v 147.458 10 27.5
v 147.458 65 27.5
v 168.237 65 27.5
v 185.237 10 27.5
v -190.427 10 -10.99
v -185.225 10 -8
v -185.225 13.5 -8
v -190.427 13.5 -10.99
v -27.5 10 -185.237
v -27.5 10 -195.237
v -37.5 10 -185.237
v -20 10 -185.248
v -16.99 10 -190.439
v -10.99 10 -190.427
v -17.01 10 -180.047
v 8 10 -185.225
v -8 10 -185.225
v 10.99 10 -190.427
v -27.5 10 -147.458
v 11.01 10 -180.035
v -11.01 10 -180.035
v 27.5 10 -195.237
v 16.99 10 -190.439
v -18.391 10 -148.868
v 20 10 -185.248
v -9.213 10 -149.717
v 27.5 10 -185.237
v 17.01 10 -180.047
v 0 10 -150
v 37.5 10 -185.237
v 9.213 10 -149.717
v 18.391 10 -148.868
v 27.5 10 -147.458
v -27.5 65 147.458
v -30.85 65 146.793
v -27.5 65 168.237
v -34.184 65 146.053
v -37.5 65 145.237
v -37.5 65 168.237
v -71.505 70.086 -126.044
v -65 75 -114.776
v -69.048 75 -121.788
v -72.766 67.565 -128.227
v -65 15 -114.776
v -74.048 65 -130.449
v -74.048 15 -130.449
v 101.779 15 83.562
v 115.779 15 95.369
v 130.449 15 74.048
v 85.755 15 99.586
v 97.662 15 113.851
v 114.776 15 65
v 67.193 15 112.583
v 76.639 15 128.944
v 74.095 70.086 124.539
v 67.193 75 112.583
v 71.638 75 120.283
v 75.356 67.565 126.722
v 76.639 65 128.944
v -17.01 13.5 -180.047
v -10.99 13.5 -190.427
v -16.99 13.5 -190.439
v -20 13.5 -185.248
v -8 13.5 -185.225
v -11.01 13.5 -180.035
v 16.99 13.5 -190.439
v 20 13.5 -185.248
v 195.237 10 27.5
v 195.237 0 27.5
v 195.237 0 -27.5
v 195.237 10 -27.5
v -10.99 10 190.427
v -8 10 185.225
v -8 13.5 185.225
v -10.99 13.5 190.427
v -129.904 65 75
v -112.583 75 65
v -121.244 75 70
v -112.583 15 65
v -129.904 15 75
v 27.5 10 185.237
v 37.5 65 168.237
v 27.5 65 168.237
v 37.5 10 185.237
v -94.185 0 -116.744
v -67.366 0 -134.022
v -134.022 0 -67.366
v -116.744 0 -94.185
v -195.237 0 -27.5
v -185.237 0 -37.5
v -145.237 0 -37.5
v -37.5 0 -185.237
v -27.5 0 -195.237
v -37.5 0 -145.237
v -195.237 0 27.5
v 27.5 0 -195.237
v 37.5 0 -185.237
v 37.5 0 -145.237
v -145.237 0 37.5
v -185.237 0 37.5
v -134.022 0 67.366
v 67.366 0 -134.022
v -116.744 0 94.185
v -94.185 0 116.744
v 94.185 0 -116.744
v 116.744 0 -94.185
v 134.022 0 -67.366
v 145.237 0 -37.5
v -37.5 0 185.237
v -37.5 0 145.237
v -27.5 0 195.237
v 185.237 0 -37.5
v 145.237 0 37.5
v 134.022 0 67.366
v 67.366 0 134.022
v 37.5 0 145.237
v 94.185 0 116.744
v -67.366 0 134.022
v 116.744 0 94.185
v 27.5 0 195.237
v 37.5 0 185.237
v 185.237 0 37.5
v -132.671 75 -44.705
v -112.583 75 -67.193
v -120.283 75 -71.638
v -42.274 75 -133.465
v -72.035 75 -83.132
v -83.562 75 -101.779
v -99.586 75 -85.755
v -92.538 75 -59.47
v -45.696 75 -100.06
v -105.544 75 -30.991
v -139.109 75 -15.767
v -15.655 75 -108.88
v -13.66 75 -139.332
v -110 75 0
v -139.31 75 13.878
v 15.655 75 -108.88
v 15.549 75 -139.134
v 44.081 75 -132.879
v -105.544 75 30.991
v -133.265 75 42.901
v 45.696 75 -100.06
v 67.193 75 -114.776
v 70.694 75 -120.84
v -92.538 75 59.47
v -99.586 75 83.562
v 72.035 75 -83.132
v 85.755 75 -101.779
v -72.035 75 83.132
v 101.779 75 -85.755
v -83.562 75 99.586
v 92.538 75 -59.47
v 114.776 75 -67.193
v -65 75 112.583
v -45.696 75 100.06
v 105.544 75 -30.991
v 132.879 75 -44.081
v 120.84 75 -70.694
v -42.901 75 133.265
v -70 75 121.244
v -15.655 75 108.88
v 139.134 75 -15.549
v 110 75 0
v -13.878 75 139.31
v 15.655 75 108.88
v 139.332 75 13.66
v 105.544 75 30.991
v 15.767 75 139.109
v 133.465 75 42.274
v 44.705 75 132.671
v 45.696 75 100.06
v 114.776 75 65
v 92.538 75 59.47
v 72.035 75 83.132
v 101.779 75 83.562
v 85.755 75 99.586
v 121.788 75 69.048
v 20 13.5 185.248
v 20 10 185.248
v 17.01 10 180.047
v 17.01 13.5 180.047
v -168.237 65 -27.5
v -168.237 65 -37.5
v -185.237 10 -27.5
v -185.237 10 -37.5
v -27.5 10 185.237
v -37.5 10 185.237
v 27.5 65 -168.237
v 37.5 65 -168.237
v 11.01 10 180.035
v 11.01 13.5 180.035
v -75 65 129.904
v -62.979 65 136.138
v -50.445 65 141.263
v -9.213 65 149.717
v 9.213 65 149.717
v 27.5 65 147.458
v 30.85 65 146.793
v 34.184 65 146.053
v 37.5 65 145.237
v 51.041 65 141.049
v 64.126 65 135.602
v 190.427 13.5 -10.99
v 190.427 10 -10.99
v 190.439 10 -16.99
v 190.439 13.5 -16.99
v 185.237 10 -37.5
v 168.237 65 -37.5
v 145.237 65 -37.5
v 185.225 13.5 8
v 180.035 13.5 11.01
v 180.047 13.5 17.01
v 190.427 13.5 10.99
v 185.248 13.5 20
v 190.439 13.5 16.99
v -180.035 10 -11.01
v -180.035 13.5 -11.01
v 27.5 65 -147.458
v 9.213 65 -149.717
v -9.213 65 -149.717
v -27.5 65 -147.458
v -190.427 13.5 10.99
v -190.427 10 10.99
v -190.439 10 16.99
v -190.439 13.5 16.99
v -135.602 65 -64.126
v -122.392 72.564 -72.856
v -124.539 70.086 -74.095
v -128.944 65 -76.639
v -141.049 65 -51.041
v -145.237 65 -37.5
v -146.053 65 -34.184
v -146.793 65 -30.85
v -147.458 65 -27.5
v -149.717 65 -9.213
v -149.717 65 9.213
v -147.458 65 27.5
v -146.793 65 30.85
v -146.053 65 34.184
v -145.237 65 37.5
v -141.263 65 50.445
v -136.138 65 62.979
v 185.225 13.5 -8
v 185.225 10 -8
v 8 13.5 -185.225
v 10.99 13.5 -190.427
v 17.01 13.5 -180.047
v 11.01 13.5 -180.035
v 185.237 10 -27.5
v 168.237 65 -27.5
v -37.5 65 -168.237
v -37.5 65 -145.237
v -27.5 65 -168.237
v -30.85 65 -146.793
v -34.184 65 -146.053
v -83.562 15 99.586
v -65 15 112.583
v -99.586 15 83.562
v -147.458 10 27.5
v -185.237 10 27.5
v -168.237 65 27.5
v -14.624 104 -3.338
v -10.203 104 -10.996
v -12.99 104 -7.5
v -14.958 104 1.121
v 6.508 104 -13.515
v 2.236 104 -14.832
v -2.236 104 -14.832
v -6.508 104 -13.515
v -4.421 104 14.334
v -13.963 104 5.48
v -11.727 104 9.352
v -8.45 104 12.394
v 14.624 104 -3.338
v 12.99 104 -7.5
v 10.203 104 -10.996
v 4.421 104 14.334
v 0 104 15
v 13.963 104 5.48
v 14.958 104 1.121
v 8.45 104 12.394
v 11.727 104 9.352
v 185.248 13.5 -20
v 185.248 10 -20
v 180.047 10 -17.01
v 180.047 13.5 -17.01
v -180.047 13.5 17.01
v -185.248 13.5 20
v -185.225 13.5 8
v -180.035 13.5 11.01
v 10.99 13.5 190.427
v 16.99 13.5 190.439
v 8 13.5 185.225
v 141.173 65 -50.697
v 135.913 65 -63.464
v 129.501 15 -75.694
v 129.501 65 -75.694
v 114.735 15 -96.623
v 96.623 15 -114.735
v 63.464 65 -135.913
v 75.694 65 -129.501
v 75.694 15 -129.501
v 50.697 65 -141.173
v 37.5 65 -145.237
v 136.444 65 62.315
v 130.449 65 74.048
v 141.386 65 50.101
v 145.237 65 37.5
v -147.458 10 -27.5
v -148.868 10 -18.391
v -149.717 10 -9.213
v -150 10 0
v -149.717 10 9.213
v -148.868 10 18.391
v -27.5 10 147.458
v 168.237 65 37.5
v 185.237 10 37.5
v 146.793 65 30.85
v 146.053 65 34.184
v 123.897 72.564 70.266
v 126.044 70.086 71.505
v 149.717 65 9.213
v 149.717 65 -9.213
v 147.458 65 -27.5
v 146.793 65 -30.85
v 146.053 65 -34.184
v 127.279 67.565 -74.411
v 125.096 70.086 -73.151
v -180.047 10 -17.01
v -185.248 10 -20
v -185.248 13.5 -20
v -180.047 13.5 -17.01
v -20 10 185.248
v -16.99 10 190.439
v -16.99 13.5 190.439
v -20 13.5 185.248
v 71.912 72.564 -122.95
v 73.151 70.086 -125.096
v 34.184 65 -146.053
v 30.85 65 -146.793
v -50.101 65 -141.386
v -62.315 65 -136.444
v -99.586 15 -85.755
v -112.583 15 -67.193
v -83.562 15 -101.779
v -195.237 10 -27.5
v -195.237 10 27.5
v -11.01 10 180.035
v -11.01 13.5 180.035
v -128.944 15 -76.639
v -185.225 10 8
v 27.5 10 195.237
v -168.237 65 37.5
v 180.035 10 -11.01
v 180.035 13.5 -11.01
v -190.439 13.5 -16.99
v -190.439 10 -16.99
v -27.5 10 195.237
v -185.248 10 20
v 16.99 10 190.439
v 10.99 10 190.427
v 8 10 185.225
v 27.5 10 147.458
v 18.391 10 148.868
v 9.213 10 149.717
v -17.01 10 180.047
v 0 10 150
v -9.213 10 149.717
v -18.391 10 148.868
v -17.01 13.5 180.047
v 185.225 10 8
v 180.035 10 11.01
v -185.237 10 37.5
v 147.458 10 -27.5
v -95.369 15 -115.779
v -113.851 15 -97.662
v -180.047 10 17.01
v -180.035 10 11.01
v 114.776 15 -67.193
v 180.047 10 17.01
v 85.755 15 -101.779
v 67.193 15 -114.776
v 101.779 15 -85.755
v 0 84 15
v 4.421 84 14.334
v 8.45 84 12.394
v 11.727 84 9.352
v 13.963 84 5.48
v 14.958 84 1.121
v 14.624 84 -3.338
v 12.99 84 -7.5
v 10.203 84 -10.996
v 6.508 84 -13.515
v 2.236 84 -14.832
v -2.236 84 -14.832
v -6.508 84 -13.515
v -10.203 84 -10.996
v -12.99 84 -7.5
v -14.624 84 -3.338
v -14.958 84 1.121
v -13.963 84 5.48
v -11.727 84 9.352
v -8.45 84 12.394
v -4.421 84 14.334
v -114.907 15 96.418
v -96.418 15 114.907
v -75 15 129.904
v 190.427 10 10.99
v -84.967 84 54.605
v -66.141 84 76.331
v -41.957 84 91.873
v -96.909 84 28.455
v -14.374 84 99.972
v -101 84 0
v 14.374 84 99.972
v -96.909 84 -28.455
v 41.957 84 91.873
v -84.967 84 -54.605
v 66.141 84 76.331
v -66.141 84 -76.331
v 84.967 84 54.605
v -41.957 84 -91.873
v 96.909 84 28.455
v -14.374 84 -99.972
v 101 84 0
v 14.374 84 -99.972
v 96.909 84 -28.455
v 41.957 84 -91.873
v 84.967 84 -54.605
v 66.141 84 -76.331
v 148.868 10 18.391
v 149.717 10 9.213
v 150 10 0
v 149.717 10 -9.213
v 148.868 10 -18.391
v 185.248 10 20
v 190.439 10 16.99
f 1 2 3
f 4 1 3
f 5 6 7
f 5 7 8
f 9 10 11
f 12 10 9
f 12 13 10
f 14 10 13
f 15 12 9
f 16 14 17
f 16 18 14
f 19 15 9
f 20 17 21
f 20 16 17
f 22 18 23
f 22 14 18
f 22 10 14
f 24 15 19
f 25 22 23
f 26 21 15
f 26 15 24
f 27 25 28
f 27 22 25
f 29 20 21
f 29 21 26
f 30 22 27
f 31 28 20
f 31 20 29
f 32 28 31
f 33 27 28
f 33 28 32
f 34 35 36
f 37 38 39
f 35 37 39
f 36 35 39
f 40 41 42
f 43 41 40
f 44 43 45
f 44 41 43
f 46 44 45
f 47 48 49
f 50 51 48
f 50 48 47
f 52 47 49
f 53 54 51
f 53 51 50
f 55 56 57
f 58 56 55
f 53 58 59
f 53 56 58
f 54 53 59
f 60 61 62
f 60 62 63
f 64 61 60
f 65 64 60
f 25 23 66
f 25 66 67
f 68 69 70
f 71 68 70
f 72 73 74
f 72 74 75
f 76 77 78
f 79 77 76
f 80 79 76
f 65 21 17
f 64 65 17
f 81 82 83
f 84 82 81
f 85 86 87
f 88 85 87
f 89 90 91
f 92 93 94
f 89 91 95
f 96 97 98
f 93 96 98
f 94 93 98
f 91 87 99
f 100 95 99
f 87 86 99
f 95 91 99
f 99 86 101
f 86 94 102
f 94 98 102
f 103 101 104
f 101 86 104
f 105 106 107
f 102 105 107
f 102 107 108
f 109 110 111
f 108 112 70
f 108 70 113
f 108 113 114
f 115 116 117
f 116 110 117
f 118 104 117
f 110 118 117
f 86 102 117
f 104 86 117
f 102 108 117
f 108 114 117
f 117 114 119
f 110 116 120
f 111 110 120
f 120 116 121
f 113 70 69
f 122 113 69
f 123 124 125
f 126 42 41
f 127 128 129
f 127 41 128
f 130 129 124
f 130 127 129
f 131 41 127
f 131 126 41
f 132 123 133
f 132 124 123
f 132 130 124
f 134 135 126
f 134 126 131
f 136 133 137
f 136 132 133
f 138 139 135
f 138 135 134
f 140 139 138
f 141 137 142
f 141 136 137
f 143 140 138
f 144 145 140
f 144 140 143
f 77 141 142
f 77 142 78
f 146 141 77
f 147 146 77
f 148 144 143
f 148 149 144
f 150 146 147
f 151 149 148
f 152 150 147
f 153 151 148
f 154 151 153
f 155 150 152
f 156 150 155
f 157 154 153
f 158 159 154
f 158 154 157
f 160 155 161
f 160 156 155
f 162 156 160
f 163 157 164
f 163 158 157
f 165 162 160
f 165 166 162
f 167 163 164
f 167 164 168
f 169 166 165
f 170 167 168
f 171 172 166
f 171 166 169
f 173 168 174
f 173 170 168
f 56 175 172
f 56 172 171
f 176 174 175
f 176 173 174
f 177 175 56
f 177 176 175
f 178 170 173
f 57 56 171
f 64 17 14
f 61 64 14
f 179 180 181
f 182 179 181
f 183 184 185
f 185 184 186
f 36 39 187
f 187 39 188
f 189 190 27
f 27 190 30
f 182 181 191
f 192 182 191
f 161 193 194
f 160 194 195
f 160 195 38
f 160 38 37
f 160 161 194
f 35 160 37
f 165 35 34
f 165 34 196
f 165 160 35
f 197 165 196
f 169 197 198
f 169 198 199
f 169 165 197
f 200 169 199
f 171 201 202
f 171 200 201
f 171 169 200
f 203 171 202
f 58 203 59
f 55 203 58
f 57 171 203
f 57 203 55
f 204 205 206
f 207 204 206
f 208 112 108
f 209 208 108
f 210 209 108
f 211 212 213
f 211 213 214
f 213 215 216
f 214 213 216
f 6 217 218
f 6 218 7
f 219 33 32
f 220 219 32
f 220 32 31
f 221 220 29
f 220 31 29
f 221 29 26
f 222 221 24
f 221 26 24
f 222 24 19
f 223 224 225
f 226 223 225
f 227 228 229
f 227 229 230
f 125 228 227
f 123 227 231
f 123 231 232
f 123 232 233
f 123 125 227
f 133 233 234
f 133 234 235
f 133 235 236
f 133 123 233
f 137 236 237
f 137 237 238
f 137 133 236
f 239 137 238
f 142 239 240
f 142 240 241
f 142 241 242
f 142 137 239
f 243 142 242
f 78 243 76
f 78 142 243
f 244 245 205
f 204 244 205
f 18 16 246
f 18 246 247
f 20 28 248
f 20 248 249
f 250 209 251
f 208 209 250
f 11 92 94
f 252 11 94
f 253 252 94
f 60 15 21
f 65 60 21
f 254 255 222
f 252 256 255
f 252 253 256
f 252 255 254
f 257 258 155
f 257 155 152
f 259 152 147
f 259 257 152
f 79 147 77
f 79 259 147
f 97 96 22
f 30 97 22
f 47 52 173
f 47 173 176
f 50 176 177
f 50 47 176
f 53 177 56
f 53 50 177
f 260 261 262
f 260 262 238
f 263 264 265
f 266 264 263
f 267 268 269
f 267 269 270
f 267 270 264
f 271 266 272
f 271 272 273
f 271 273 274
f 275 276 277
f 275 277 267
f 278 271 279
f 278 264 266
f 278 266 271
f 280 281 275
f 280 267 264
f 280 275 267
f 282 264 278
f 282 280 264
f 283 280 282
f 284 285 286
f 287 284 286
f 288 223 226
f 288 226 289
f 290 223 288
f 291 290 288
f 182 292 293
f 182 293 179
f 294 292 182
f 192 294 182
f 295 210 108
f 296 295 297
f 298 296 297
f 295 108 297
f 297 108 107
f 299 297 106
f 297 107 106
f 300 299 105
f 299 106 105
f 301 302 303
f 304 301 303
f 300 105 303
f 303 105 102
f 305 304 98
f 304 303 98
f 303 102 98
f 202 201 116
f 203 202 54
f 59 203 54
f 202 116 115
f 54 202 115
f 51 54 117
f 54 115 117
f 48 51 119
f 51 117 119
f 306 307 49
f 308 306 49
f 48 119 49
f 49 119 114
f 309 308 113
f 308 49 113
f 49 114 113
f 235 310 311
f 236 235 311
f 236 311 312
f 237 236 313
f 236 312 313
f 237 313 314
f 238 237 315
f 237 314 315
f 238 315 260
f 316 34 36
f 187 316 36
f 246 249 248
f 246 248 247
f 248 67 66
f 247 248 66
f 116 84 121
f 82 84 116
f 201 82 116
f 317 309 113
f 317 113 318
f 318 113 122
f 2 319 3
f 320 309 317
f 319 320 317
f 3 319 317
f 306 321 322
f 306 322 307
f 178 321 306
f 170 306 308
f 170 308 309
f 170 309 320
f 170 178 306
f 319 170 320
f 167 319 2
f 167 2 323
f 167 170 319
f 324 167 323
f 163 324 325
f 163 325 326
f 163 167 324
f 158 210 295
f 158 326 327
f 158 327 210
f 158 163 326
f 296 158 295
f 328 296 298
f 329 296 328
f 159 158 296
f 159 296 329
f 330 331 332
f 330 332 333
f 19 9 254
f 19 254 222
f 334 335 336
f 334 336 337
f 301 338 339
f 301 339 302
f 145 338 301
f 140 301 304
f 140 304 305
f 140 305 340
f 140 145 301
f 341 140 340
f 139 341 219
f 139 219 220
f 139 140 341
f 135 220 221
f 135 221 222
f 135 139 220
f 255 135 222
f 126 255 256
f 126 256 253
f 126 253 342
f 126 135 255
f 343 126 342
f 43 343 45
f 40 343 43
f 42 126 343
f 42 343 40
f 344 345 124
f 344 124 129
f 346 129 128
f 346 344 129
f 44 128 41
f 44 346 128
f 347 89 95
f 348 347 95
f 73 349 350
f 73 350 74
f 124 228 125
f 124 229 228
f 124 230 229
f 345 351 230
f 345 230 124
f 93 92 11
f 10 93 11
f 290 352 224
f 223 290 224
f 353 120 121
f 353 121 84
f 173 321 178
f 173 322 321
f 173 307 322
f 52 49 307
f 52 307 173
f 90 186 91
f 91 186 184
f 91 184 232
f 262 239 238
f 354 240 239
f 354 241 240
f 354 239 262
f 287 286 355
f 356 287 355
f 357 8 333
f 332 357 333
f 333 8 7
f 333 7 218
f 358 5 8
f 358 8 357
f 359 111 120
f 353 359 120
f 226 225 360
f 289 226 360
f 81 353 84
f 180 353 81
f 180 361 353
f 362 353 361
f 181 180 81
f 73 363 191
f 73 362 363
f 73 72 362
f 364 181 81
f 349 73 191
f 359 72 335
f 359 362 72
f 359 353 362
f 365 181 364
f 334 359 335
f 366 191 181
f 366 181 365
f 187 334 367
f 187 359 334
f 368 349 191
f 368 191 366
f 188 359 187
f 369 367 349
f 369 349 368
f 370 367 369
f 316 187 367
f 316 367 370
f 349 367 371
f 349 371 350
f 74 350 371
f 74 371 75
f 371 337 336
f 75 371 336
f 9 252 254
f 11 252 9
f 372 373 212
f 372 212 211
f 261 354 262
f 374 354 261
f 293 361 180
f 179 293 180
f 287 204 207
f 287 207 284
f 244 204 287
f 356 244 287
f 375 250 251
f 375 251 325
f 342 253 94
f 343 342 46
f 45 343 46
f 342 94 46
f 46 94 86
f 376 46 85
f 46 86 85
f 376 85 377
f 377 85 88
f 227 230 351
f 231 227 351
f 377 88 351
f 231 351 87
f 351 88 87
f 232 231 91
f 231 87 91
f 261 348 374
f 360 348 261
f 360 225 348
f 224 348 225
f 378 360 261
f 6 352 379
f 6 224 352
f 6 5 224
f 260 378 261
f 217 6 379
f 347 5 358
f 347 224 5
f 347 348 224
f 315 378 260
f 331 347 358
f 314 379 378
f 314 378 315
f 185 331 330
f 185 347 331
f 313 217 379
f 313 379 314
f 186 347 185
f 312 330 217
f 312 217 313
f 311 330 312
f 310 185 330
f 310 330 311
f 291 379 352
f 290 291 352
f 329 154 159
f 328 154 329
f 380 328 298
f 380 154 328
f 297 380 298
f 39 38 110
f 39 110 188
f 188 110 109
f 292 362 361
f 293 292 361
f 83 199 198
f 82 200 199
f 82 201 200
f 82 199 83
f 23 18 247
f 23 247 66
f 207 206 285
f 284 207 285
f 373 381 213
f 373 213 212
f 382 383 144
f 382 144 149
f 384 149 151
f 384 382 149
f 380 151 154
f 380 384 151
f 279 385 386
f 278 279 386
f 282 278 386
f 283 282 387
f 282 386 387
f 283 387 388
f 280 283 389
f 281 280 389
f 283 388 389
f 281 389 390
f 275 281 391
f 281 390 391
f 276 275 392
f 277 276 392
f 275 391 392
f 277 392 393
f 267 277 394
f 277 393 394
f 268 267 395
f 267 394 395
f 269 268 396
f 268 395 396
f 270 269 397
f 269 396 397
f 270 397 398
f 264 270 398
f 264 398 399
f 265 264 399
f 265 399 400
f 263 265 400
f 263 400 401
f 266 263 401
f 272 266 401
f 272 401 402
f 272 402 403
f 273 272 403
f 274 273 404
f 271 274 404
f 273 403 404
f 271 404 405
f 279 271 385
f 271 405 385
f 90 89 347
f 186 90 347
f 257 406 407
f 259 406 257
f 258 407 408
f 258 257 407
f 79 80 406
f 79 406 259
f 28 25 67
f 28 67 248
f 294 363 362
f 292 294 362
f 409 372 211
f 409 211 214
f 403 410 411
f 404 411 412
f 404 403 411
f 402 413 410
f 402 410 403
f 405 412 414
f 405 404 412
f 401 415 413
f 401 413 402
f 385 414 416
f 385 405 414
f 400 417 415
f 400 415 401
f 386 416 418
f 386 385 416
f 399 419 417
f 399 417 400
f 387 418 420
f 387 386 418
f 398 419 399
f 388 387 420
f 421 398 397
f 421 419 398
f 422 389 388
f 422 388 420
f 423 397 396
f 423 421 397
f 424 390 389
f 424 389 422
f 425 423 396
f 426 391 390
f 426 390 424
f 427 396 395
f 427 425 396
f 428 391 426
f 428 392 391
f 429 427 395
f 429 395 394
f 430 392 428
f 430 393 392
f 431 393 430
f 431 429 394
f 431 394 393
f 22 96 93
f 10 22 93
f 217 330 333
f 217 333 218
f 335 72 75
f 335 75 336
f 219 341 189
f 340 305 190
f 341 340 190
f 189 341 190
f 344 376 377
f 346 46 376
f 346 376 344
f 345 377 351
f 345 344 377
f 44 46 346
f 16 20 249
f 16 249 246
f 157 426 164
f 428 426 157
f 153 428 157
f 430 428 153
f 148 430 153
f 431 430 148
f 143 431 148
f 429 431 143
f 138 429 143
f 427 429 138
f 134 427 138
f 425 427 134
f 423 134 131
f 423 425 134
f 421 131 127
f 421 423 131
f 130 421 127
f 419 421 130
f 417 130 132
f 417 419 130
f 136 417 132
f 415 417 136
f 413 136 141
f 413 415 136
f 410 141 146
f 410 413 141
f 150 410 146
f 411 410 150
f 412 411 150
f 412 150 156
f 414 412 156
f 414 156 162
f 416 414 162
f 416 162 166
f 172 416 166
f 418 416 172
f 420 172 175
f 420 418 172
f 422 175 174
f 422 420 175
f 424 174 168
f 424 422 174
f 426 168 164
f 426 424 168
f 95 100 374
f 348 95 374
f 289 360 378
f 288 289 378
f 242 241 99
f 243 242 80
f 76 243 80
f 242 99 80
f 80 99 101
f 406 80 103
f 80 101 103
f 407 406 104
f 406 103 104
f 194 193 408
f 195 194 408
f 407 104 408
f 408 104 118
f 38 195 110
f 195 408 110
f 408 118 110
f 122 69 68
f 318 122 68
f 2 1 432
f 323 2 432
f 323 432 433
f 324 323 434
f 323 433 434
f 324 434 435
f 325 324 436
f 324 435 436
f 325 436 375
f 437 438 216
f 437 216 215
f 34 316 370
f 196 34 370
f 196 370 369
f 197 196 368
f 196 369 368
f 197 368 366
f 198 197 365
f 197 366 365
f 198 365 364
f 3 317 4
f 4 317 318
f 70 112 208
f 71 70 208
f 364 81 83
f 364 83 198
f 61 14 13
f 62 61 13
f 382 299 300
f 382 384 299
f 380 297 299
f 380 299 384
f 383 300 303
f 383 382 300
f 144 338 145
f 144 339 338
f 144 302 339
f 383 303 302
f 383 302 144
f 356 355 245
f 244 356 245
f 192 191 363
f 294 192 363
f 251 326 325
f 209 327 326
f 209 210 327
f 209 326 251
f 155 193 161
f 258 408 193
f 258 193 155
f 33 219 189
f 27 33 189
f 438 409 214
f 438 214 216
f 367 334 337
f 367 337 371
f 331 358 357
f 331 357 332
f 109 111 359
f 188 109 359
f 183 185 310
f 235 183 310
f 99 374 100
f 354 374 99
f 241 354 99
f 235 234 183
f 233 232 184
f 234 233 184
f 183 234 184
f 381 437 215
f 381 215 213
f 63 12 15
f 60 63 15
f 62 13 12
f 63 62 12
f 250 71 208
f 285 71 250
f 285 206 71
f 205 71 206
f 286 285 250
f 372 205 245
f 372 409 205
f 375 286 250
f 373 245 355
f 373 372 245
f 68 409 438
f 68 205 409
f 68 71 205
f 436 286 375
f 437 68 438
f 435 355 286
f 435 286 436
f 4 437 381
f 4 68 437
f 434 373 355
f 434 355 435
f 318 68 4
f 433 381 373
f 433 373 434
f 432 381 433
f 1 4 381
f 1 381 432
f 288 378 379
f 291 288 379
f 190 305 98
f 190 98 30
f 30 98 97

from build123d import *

# Parameters (mm, degrees)
SKETCH1_R                    = 150
BOSS_EXTRUDE1_DEPTH          = 75
CHAMFER1_SIZE                = 10
BOSS_EXTRUDE2_START          = -75
BOSS_EXTRUDE2_DEPTH          = 10
CHAMFER2_SIZE                = 10
BOSS_EXTRUDE3_DEPTH          = 10
BOSS_EXTRUDE4_DEPTH          = 3.5
CIRPATTERN1_COUNT            = 4
CIRPATTERN1_COPY_1_DEPTH     = 10
CIRPATTERN1_COPY_2_DEPTH     = 10
CIRPATTERN1_COPY_3_DEPTH     = 10
CIRPATTERN1_COPY_4_DEPTH     = 3.5
CIRPATTERN1_COPY_5_DEPTH     = 3.5
CIRPATTERN1_COPY_6_DEPTH     = 3.5
CHAMFER2_OF_CIRPATTERN1_SIZE = 10
CUT_EXTRUDE1_START           = -60
CUT_EXTRUDE1_DEPTH           = 60
CIRPATTERN3_COUNT            = 4
SKETCH15_R                   = 110
BOSS_EXTRUDE6_DEPTH          = 9
BOSS_EXTRUDE6_TAPER          = 45
SKETCH16_R                   = 15
BOSS_EXTRUDE7_DEPTH          = 20


# Read off the part's stored shape, not the designer's step: Cut-Extrude1
with BuildPart() as part:
    # Sketch1 → Boss-Extrude1 (new body)
    with BuildSketch(Plane(origin=(0, 0, 0), x_dir=(1, 0, 0), z_dir=(0, 1, 0))):
        with Locations(Location((0, 0, 0), (0, 0, 270))):
            Circle(SKETCH1_R)
    extrude(amount=BOSS_EXTRUDE1_DEPTH)

    # Chamfer1
    chamfer1_edges = [part.edges().sort_by_distance(p)[0] for p in [
        (0, 75, -150),
    ]]
    chamfer(chamfer1_edges, length=CHAMFER1_SIZE)

    # Sketch2 → Boss-Extrude2 (add)
    with BuildSketch(Plane(origin=(0, 75, 0), x_dir=(1, 0, 0), z_dir=(0, 1, 0)).offset(BOSS_EXTRUDE2_START)):
        with BuildLine():
            ThreePointArc((-145.236875483, -37.5), (-148.80445444, -18.900643872), (-150, 0))
            Line((-150, 0), (-195.236875483, 0))
            Line((-195.236875483, 0), (-195.236875483, -37.5))
            Line((-195.236875483, -37.5), (-145.236875483, -37.5))
        make_face()
        with BuildLine():
            Line((-195.236875483, 0), (-150, 0))
            ThreePointArc((-150, 0), (-148.80445444, 18.900643872), (-145.236875483, 37.5))
            Line((-145.236875483, 37.5), (-195.236875483, 37.5))
            Line((-195.236875483, 37.5), (-195.236875483, 0))
        make_face()
    boss_extrude2 = extrude(amount=BOSS_EXTRUDE2_DEPTH)

    # Chamfer2
    chamfer2_edges = [part.edges().sort_by_distance(p)[0] for p in [
        (-195.236875483, 5, -37.5),
        (-195.236875483, 5, 37.5),
    ]]
    chamfer(chamfer2_edges, length=CHAMFER2_SIZE)

    # Sketch5 → Boss-Extrude3 (add)
    with BuildSketch(Plane.XY.offset(37.5)):
        Polygon((-145.236875483, 10), (-145.236875483, 65), (-168.236875483, 65), (-185.236875483, 10), align=None)
    boss_extrude3 = extrude(amount=-BOSS_EXTRUDE3_DEPTH)

    # Sketch7 → Boss-Extrude4 (add)
    with BuildSketch(Plane(origin=(0, 10, 0), x_dir=(1, 0, 0), z_dir=(0, 1, 0))):
        Polygon((-180.034917045, -11.010056312), (-185.225263454, -8), (-190.427221891, -10.989943688), (-190.43883392, -16.989943688), (-185.248487512, -20), (-180.046529075, -17.010056312), align=None)
    boss_extrude4 = extrude(amount=BOSS_EXTRUDE4_DEPTH)

    # Mirror2: Boss-Extrude3, Boss-Extrude4 across plane
    add(boss_extrude3.mirror(Plane.XY))
    add(boss_extrude4.mirror(Plane.XY))

    # CirPattern1: Boss-Extrude2, Boss-Extrude3, Boss-Extrude4 ×4 about axis
    cirpattern1_axis = Axis((0, 0, 0), (0, 1, 0))
    add([boss_extrude2.rotate(cirpattern1_axis, i * 360 / CIRPATTERN1_COUNT) for i in range(1, CIRPATTERN1_COUNT)])
    add([boss_extrude3.rotate(cirpattern1_axis, i * 360 / CIRPATTERN1_COUNT) for i in range(1, CIRPATTERN1_COUNT)])
    add([boss_extrude4.rotate(cirpattern1_axis, i * 360 / CIRPATTERN1_COUNT) for i in range(1, CIRPATTERN1_COUNT)])

    # CirPattern1 copy 1 sketch → CirPattern1 copy 1 (add)
    with BuildSketch(Plane(origin=(-37.5, 0, 0), x_dir=(0, 0, -1), z_dir=(-1, 0, 0))):
        Polygon((-145.236875483, -10), (-145.236875483, -65), (-168.236875483, -65), (-185.236875483, -10), align=None)
    extrude(amount=-CIRPATTERN1_COPY_1_DEPTH)

    # CirPattern1 copy 2 sketch → CirPattern1 copy 2 (add)
    with BuildSketch(Plane(origin=(0, 0, 37.5), x_dir=(-1, 0, 0), z_dir=(0, 0, 1))):
        Polygon((-145.236875483, -10), (-145.236875483, -65), (-168.236875483, -65), (-185.236875483, -10), align=None)
    extrude(amount=-CIRPATTERN1_COPY_2_DEPTH)

    # CirPattern1 copy 3 sketch → CirPattern1 copy 3 (add)
    with BuildSketch(Plane(origin=(37.5, 0, 0), x_dir=(0, 0, 1), z_dir=(1, 0, 0))):
        Polygon((-145.236875483, -10), (-145.236875483, -65), (-168.236875483, -65), (-185.236875483, -10), align=None)
    extrude(amount=-CIRPATTERN1_COPY_3_DEPTH)

    # CirPattern1 copy 4 sketch → CirPattern1 copy 4 (add)
    with BuildSketch(Plane(origin=(0, 10, 0), x_dir=(0, 0, -1), z_dir=(0, 1, 0))):
        Polygon((-180.034917045, 11.010056312), (-185.225263454, 8), (-190.427221891, 10.989943688), (-190.43883392, 16.989943688), (-185.248487512, 20), (-180.046529075, 17.010056312), align=None)
    extrude(amount=CIRPATTERN1_COPY_4_DEPTH)

    # CirPattern1 copy 5 sketch → CirPattern1 copy 5 (add)
    with BuildSketch(Plane(origin=(0, 10, 0), x_dir=(-1, 0, 0), z_dir=(0, 1, 0))):
        Polygon((-180.034917045, 11.010056312), (-185.225263454, 8), (-190.427221891, 10.989943688), (-190.43883392, 16.989943688), (-185.248487512, 20), (-180.046529075, 17.010056312), align=None)
    extrude(amount=CIRPATTERN1_COPY_5_DEPTH)

    # CirPattern1 copy 6 sketch → CirPattern1 copy 6 (add)
    with BuildSketch(Plane.ZX.offset(10)):
        Polygon((-180.034917045, 11.010056312), (-185.225263454, 8), (-190.427221891, 10.989943688), (-190.43883392, 16.989943688), (-185.248487512, 20), (-180.046529075, 17.010056312), align=None)
    extrude(amount=CIRPATTERN1_COPY_6_DEPTH)

    # Chamfer2 of CirPattern1
    chamfer2_of_cirpattern1_edges = [part.edges().sort_by_distance(p)[0] for p in [
        (-37.5, 5, 195.236875483),
        (37.5, 5, 195.236875483),
        (195.236875483, 5, 37.5),
        (195.236875483, 5, -37.5),
        (37.5, 5, -195.236875483),
        (-37.5, 5, -195.236875483),
    ]]
    chamfer(chamfer2_of_cirpattern1_edges, length=CHAMFER2_OF_CIRPATTERN1_SIZE)

    # Cut-Extrude1 outline → Cut-Extrude1 (cut)
    with BuildSketch(Plane(origin=(0, 75, 0), x_dir=(1, 0, 0), z_dir=(0, 1, 0)).offset(CUT_EXTRUDE1_START)):
        with BuildLine():
            ThreePointArc((-65, -112.583302492), (-91.923881554, -91.923881554), (-112.583302492, -65))
            Line((-112.583302492, -65), (-129.903810568, -75))
            ThreePointArc((-129.903810568, -75), (-106.066017178, -106.066017178), (-75, -129.903810568))
            Line((-75, -129.903810568), (-65, -112.583302492))
        make_face()
    cut_extrude1 = extrude(amount=CUT_EXTRUDE1_DEPTH, mode=Mode.SUBTRACT)

    # CirPattern3: Cut-Extrude1 ×4 about axis
    cirpattern3_axis = Axis((1.096442134, 0, -1.096442134), (0, 1, 0))
    for i in range(1, CIRPATTERN3_COUNT):
        add(cut_extrude1.rotate(cirpattern3_axis, i * 360 / CIRPATTERN3_COUNT), mode=Mode.SUBTRACT)

    # Sketch15 → Boss-Extrude6 (add)
    with BuildSketch(Plane(origin=(0, 75, 0), x_dir=(1, 0, 0), z_dir=(0, 1, 0))):
        Circle(SKETCH15_R)
    extrude(amount=BOSS_EXTRUDE6_DEPTH, taper=BOSS_EXTRUDE6_TAPER)

    # Sketch16 → Boss-Extrude7 (add)
    with BuildSketch(Plane(origin=(0, 84, 0), x_dir=(1, 0, 0), z_dir=(0, 1, 0))):
        with Locations(Location((0, 0, 0), (0, 0, 270))):
            Circle(SKETCH16_R)
    extrude(amount=BOSS_EXTRUDE7_DEPTH)


solid = part.part
